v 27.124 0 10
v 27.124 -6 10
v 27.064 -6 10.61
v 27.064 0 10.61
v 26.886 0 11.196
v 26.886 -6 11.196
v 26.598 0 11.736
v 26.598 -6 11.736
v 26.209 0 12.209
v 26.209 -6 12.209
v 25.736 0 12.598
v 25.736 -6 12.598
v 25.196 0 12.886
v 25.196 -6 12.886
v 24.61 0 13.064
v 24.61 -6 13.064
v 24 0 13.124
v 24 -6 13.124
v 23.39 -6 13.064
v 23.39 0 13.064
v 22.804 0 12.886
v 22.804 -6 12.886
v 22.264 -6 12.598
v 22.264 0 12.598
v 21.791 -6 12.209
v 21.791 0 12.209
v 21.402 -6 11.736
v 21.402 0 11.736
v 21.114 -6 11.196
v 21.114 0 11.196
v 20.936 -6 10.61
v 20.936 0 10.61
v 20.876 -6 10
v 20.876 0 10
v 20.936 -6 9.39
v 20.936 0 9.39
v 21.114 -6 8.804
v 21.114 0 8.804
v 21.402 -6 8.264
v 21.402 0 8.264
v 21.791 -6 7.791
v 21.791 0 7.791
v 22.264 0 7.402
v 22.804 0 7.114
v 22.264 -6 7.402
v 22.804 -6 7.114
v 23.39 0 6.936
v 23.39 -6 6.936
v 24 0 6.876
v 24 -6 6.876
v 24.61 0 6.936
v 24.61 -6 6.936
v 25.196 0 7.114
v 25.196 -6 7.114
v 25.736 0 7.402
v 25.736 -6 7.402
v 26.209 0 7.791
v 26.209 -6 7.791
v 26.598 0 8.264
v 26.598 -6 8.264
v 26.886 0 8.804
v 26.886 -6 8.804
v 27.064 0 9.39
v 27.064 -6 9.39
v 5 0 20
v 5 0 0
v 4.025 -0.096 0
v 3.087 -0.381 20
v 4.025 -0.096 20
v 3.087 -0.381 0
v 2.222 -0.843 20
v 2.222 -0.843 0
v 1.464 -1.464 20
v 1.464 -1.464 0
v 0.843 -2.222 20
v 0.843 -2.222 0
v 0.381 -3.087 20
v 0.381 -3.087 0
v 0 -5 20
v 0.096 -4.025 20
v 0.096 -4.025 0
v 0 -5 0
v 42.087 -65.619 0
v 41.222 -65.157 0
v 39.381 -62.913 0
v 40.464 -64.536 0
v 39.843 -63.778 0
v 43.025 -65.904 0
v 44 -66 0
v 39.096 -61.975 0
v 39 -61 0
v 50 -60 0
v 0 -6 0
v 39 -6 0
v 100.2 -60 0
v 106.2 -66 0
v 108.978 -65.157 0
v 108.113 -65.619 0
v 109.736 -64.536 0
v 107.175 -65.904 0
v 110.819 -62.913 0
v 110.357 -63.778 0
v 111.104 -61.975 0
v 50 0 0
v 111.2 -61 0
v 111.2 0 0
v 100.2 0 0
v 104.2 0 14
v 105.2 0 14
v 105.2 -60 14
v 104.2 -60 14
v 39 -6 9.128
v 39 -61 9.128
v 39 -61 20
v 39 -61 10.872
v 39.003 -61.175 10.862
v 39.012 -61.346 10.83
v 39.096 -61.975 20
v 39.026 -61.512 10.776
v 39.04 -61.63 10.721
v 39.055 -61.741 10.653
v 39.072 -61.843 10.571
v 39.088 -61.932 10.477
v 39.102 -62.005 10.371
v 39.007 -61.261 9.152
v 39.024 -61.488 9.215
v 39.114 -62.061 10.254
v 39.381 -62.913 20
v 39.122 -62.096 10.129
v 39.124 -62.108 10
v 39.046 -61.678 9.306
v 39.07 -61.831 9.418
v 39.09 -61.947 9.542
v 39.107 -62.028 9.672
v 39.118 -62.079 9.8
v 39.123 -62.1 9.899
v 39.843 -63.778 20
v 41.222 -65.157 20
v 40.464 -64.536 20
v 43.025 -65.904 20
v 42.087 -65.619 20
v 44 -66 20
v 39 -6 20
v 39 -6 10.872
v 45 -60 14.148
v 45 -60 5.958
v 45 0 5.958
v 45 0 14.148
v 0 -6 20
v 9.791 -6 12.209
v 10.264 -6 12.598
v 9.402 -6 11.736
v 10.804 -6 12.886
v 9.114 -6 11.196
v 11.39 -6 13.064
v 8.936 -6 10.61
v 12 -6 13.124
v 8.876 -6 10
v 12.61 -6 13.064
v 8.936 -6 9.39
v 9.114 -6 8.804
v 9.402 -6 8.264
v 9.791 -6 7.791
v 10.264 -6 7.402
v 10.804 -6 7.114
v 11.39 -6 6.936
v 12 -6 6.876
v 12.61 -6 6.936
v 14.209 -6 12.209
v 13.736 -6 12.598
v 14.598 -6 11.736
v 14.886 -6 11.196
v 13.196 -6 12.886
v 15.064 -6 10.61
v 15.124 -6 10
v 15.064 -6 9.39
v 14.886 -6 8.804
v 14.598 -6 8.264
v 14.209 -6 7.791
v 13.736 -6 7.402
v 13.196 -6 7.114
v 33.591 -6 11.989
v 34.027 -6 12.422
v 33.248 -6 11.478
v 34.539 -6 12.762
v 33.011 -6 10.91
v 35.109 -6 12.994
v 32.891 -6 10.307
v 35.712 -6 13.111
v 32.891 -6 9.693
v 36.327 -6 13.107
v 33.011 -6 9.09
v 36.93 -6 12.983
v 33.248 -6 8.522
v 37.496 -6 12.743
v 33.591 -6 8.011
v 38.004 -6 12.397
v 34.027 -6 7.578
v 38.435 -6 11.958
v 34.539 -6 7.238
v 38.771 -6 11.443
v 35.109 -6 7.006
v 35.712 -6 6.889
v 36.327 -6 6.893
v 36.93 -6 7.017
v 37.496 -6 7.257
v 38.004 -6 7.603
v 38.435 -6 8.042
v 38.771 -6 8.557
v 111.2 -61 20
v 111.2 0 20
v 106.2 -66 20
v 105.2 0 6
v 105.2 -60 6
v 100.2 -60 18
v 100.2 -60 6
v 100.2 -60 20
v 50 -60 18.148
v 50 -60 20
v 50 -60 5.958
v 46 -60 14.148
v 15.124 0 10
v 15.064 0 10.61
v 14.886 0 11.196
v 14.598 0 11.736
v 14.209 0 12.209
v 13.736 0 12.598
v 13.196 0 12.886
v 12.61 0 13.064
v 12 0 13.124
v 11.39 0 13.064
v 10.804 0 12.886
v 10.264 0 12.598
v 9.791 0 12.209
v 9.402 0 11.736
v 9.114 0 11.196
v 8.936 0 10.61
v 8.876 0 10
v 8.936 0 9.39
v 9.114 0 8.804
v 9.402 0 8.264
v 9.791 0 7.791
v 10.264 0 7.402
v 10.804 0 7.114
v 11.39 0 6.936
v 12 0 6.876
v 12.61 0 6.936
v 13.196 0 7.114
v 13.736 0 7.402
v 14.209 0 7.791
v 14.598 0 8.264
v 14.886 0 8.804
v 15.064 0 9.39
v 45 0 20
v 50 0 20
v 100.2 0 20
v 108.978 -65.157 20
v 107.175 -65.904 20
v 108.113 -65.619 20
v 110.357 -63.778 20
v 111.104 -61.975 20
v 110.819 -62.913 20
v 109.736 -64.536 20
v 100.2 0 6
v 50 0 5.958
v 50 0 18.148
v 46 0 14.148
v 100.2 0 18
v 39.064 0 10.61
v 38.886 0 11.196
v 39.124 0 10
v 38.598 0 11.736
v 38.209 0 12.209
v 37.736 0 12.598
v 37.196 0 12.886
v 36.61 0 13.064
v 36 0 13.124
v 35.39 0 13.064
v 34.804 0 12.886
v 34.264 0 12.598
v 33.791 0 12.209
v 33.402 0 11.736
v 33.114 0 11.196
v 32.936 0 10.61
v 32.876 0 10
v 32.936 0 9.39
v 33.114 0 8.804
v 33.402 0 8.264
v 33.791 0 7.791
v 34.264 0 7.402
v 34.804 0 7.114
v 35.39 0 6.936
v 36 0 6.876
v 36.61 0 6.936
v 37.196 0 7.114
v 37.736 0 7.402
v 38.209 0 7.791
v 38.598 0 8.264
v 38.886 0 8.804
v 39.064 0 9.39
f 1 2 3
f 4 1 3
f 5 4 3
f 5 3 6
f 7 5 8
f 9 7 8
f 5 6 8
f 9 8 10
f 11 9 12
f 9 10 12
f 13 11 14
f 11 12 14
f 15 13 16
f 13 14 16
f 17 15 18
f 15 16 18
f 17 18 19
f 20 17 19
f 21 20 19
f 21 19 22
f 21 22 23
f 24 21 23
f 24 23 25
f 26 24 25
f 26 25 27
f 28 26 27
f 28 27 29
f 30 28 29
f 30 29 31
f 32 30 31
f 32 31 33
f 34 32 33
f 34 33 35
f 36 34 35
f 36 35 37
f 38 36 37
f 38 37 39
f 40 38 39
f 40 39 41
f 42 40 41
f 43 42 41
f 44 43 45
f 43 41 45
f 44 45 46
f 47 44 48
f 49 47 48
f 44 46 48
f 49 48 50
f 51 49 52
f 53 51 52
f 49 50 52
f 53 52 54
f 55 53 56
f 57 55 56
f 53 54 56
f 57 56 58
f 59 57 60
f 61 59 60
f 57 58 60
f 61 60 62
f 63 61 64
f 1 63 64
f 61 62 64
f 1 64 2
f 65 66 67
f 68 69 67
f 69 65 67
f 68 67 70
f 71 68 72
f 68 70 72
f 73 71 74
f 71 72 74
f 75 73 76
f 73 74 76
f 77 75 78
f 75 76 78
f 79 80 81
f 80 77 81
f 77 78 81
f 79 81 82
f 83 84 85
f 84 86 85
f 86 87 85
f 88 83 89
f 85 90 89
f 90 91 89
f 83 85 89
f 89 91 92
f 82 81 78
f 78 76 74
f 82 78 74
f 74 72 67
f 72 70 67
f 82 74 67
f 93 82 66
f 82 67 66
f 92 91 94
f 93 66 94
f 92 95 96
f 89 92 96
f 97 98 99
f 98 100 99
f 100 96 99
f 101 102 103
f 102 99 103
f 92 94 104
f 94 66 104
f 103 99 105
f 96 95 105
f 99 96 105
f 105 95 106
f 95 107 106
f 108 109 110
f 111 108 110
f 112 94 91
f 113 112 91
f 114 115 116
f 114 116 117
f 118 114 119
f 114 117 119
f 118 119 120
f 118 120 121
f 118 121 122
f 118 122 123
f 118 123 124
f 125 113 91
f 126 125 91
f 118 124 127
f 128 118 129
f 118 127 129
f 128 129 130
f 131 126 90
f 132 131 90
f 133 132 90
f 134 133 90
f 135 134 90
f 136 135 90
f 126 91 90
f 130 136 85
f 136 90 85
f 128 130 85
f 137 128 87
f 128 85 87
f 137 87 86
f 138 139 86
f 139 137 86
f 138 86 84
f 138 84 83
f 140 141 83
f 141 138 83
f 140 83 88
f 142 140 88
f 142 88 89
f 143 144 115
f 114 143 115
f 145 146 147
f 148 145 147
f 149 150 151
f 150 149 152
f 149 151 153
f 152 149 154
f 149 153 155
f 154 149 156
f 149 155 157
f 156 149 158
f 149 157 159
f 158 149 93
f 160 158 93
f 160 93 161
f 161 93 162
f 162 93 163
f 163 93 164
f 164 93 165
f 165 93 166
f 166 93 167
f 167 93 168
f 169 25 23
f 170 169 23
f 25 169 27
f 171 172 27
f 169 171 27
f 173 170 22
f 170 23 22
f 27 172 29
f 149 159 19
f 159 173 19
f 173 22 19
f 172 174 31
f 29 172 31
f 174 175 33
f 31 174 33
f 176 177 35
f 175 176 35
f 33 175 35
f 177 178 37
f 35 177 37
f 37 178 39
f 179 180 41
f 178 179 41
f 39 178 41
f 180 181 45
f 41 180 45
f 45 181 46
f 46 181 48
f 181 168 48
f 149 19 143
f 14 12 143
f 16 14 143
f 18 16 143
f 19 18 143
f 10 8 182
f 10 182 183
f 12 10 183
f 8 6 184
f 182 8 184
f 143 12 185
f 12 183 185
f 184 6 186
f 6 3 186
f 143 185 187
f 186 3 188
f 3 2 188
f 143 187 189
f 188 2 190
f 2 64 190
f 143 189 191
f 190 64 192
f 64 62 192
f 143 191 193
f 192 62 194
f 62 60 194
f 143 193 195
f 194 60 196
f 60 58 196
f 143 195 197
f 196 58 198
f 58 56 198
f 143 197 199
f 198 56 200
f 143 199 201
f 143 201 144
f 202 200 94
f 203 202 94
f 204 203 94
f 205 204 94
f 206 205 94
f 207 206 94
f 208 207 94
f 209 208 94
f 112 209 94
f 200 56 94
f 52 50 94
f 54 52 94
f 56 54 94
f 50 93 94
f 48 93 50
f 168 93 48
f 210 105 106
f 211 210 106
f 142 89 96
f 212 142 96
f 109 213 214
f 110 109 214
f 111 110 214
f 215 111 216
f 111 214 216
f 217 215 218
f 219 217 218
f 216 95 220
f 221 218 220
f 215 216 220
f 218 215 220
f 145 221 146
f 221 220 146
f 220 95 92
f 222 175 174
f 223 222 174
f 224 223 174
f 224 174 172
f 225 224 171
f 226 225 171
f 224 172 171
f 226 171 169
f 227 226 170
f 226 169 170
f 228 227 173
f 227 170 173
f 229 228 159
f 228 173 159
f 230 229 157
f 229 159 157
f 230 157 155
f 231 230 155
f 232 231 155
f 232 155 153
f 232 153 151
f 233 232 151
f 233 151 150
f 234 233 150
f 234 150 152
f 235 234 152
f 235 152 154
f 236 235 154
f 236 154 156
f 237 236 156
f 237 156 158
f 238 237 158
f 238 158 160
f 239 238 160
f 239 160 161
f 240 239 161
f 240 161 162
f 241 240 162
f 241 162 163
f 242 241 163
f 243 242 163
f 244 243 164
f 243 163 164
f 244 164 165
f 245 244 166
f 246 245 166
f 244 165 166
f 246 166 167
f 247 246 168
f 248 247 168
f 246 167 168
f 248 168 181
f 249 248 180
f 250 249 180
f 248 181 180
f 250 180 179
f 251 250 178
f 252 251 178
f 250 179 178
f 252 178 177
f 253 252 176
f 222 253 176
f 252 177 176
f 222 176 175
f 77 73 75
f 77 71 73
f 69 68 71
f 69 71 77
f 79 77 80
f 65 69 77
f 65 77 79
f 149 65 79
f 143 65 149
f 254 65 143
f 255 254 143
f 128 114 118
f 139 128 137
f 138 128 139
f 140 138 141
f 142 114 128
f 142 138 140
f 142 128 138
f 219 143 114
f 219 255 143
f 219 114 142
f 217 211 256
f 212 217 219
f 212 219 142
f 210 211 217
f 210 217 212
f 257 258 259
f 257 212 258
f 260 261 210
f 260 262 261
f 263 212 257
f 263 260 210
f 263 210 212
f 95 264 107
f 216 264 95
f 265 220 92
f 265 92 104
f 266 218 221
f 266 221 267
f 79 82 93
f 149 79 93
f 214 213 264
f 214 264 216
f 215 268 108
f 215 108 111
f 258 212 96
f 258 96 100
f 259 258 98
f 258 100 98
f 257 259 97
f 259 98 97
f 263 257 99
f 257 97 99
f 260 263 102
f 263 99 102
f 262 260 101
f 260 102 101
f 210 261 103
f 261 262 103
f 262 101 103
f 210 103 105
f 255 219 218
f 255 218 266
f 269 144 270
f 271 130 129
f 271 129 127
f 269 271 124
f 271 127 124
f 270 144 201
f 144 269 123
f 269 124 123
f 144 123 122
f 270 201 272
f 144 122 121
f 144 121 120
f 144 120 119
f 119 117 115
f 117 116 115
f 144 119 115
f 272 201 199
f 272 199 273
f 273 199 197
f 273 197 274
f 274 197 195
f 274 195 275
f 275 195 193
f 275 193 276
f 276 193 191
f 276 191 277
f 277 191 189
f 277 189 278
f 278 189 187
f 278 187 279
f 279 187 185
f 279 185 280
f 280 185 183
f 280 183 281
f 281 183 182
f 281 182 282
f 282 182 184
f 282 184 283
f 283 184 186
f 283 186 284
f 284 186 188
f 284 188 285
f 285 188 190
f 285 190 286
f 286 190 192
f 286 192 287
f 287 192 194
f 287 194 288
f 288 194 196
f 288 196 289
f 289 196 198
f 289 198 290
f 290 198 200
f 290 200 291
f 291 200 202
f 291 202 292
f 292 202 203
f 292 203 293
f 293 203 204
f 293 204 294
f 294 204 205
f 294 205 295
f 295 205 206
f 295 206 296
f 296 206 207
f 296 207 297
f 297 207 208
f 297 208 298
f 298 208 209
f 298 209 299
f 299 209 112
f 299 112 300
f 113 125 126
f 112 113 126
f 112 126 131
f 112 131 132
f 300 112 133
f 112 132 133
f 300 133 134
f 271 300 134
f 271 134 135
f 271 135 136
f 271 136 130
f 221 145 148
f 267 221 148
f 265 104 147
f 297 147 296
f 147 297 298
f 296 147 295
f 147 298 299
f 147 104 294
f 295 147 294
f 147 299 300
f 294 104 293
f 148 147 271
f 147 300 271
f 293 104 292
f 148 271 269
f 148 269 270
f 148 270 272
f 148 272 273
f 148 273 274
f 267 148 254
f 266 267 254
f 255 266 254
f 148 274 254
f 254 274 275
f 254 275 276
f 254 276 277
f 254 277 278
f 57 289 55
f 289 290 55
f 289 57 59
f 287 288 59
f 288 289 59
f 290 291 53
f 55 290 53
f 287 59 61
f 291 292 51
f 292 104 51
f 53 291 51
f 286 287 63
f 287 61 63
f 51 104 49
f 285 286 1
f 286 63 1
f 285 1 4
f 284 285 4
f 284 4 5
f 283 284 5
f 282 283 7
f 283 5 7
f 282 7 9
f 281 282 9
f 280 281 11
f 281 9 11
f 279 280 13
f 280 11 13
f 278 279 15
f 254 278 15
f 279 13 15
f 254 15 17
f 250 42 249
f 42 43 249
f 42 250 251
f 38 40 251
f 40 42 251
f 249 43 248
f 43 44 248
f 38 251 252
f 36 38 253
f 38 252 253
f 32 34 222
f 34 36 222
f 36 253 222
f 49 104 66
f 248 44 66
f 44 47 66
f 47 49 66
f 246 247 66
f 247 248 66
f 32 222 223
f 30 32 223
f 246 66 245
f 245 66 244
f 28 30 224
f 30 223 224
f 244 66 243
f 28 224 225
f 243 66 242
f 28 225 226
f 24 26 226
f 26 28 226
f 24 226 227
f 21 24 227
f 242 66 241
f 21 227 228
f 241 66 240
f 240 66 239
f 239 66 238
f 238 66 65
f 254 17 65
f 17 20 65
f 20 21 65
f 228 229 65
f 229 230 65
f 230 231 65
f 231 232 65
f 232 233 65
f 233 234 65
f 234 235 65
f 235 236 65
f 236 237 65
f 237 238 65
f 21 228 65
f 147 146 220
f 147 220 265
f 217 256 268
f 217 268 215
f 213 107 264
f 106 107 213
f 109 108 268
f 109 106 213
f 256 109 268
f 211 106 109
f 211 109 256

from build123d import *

# Parameters (mm, degrees)
F1_DEPTH    = 20
F3_D        = 6.2484
F4_W        = 60
F4_H        = 6
F6_DEPTH    = 5
F5_W        = 60
F5_H        = 5.8524994925
F5_H_2      = 5.9575000778
F7_DEPTH    = 5
F8_SIZE     = 4
F9_T1_DEPTH = 45
F9_T3_DEPTH = 34.127861456
F9_T5_DEPTH = 34.127861456


# Not quite as in the source:
# - a fillet or chamfer that OpenCascade refuses, or shapes differently, is made with other operations: its cross-section is extruded or revolved along the edge and cut away or added


with BuildPart() as f1:
    # F0 (on Top) → F1 (new body)
    with BuildSketch(Plane.XY):
        Polygon((45, 0), (0, 0), (0, -6), (39, -6), (39, -66), (111.2, -66), (111.2, 0), (105.2, 0), (105.2, -60), (45, -60), align=None)
    extrude(amount=F1_DEPTH)

    # F3 (through all)
    with Locations(Plane(origin=(0, 0, 0), x_dir=(-1, 0, 0), z_dir=(0, 1, 0))):
        with Locations((-36, 10), (-24, 10), (-12, 10)):
            Hole(F3_D / 2)

    # F4 (on face) → F6 (join)
    with BuildSketch(Plane(origin=(105.2, 0, 0), x_dir=(0, -1, 0), z_dir=(-1, 0, 0))):
        with Locations((30, 17)):
            Rectangle(F4_W, F4_H)
        with Locations((30, 3)):
            Rectangle(F4_W, F4_H)
    extrude(amount=F6_DEPTH)

    # F5 (on face) → F7 (join)
    with BuildSketch(Plane.YZ.offset(45)):
        with Locations((-30, 17.0737502538)):
            Rectangle(F5_W, F5_H)
        with Locations((-30, 2.9787500389)):
            Rectangle(F5_W, F5_H_2)
    extrude(amount=F7_DEPTH)

    # F8
    f8_edges = [f1.edges().sort_by_distance(p)[0] for p in [
        (50, -30, 14.147501),
        (100.2, -30, 14),
    ]]
    chamfer(f8_edges, length=F8_SIZE)

    # F9: fillet of radius 5 on 4 edges, made by hand

    # F9_s2 → F9_t1 (cut)
    with BuildSketch(Plane.XY.offset(-12.5)):
        with BuildLine():
            ThreePointArc((106.2, -66), (109.7355339059, -64.5355339059), (111.2, -61))
            Line((111.2, -61), (111.2, -66))
            Line((111.2, -66), (106.2, -66))
        make_face()
        with BuildLine():
            ThreePointArc((5, 0), (1.4644660941, -1.4644660941), (0, -5))
            Line((0, -5), (0, 0))
            Line((0, 0), (5, 0))
        make_face()
    extrude(amount=F9_T1_DEPTH, mode=Mode.SUBTRACT)

    # F9_s4 → F9_t3 (cut)
    with BuildSketch(Plane.XY.offset(-1.627861456)):
        with BuildLine():
            ThreePointArc((39, -61), (40.4644660941, -64.5355339059), (44, -66))
            Line((44, -66), (39, -66))
            Line((39, -66), (39, -61))
        make_face()
    extrude(amount=F9_T3_DEPTH, mode=Mode.SUBTRACT)

    # F9_s6 → F9_t5 (cut)
    with BuildSketch(Plane.XY.offset(-12.5)):
        with BuildLine():
            ThreePointArc((44, -66), (40.4644660941, -64.5355339059), (39, -61))
            Line((39, -61), (39, -66))
            Line((39, -66), (44, -66))
        make_face()
    extrude(amount=F9_T5_DEPTH, mode=Mode.SUBTRACT)


solid = f1.part
